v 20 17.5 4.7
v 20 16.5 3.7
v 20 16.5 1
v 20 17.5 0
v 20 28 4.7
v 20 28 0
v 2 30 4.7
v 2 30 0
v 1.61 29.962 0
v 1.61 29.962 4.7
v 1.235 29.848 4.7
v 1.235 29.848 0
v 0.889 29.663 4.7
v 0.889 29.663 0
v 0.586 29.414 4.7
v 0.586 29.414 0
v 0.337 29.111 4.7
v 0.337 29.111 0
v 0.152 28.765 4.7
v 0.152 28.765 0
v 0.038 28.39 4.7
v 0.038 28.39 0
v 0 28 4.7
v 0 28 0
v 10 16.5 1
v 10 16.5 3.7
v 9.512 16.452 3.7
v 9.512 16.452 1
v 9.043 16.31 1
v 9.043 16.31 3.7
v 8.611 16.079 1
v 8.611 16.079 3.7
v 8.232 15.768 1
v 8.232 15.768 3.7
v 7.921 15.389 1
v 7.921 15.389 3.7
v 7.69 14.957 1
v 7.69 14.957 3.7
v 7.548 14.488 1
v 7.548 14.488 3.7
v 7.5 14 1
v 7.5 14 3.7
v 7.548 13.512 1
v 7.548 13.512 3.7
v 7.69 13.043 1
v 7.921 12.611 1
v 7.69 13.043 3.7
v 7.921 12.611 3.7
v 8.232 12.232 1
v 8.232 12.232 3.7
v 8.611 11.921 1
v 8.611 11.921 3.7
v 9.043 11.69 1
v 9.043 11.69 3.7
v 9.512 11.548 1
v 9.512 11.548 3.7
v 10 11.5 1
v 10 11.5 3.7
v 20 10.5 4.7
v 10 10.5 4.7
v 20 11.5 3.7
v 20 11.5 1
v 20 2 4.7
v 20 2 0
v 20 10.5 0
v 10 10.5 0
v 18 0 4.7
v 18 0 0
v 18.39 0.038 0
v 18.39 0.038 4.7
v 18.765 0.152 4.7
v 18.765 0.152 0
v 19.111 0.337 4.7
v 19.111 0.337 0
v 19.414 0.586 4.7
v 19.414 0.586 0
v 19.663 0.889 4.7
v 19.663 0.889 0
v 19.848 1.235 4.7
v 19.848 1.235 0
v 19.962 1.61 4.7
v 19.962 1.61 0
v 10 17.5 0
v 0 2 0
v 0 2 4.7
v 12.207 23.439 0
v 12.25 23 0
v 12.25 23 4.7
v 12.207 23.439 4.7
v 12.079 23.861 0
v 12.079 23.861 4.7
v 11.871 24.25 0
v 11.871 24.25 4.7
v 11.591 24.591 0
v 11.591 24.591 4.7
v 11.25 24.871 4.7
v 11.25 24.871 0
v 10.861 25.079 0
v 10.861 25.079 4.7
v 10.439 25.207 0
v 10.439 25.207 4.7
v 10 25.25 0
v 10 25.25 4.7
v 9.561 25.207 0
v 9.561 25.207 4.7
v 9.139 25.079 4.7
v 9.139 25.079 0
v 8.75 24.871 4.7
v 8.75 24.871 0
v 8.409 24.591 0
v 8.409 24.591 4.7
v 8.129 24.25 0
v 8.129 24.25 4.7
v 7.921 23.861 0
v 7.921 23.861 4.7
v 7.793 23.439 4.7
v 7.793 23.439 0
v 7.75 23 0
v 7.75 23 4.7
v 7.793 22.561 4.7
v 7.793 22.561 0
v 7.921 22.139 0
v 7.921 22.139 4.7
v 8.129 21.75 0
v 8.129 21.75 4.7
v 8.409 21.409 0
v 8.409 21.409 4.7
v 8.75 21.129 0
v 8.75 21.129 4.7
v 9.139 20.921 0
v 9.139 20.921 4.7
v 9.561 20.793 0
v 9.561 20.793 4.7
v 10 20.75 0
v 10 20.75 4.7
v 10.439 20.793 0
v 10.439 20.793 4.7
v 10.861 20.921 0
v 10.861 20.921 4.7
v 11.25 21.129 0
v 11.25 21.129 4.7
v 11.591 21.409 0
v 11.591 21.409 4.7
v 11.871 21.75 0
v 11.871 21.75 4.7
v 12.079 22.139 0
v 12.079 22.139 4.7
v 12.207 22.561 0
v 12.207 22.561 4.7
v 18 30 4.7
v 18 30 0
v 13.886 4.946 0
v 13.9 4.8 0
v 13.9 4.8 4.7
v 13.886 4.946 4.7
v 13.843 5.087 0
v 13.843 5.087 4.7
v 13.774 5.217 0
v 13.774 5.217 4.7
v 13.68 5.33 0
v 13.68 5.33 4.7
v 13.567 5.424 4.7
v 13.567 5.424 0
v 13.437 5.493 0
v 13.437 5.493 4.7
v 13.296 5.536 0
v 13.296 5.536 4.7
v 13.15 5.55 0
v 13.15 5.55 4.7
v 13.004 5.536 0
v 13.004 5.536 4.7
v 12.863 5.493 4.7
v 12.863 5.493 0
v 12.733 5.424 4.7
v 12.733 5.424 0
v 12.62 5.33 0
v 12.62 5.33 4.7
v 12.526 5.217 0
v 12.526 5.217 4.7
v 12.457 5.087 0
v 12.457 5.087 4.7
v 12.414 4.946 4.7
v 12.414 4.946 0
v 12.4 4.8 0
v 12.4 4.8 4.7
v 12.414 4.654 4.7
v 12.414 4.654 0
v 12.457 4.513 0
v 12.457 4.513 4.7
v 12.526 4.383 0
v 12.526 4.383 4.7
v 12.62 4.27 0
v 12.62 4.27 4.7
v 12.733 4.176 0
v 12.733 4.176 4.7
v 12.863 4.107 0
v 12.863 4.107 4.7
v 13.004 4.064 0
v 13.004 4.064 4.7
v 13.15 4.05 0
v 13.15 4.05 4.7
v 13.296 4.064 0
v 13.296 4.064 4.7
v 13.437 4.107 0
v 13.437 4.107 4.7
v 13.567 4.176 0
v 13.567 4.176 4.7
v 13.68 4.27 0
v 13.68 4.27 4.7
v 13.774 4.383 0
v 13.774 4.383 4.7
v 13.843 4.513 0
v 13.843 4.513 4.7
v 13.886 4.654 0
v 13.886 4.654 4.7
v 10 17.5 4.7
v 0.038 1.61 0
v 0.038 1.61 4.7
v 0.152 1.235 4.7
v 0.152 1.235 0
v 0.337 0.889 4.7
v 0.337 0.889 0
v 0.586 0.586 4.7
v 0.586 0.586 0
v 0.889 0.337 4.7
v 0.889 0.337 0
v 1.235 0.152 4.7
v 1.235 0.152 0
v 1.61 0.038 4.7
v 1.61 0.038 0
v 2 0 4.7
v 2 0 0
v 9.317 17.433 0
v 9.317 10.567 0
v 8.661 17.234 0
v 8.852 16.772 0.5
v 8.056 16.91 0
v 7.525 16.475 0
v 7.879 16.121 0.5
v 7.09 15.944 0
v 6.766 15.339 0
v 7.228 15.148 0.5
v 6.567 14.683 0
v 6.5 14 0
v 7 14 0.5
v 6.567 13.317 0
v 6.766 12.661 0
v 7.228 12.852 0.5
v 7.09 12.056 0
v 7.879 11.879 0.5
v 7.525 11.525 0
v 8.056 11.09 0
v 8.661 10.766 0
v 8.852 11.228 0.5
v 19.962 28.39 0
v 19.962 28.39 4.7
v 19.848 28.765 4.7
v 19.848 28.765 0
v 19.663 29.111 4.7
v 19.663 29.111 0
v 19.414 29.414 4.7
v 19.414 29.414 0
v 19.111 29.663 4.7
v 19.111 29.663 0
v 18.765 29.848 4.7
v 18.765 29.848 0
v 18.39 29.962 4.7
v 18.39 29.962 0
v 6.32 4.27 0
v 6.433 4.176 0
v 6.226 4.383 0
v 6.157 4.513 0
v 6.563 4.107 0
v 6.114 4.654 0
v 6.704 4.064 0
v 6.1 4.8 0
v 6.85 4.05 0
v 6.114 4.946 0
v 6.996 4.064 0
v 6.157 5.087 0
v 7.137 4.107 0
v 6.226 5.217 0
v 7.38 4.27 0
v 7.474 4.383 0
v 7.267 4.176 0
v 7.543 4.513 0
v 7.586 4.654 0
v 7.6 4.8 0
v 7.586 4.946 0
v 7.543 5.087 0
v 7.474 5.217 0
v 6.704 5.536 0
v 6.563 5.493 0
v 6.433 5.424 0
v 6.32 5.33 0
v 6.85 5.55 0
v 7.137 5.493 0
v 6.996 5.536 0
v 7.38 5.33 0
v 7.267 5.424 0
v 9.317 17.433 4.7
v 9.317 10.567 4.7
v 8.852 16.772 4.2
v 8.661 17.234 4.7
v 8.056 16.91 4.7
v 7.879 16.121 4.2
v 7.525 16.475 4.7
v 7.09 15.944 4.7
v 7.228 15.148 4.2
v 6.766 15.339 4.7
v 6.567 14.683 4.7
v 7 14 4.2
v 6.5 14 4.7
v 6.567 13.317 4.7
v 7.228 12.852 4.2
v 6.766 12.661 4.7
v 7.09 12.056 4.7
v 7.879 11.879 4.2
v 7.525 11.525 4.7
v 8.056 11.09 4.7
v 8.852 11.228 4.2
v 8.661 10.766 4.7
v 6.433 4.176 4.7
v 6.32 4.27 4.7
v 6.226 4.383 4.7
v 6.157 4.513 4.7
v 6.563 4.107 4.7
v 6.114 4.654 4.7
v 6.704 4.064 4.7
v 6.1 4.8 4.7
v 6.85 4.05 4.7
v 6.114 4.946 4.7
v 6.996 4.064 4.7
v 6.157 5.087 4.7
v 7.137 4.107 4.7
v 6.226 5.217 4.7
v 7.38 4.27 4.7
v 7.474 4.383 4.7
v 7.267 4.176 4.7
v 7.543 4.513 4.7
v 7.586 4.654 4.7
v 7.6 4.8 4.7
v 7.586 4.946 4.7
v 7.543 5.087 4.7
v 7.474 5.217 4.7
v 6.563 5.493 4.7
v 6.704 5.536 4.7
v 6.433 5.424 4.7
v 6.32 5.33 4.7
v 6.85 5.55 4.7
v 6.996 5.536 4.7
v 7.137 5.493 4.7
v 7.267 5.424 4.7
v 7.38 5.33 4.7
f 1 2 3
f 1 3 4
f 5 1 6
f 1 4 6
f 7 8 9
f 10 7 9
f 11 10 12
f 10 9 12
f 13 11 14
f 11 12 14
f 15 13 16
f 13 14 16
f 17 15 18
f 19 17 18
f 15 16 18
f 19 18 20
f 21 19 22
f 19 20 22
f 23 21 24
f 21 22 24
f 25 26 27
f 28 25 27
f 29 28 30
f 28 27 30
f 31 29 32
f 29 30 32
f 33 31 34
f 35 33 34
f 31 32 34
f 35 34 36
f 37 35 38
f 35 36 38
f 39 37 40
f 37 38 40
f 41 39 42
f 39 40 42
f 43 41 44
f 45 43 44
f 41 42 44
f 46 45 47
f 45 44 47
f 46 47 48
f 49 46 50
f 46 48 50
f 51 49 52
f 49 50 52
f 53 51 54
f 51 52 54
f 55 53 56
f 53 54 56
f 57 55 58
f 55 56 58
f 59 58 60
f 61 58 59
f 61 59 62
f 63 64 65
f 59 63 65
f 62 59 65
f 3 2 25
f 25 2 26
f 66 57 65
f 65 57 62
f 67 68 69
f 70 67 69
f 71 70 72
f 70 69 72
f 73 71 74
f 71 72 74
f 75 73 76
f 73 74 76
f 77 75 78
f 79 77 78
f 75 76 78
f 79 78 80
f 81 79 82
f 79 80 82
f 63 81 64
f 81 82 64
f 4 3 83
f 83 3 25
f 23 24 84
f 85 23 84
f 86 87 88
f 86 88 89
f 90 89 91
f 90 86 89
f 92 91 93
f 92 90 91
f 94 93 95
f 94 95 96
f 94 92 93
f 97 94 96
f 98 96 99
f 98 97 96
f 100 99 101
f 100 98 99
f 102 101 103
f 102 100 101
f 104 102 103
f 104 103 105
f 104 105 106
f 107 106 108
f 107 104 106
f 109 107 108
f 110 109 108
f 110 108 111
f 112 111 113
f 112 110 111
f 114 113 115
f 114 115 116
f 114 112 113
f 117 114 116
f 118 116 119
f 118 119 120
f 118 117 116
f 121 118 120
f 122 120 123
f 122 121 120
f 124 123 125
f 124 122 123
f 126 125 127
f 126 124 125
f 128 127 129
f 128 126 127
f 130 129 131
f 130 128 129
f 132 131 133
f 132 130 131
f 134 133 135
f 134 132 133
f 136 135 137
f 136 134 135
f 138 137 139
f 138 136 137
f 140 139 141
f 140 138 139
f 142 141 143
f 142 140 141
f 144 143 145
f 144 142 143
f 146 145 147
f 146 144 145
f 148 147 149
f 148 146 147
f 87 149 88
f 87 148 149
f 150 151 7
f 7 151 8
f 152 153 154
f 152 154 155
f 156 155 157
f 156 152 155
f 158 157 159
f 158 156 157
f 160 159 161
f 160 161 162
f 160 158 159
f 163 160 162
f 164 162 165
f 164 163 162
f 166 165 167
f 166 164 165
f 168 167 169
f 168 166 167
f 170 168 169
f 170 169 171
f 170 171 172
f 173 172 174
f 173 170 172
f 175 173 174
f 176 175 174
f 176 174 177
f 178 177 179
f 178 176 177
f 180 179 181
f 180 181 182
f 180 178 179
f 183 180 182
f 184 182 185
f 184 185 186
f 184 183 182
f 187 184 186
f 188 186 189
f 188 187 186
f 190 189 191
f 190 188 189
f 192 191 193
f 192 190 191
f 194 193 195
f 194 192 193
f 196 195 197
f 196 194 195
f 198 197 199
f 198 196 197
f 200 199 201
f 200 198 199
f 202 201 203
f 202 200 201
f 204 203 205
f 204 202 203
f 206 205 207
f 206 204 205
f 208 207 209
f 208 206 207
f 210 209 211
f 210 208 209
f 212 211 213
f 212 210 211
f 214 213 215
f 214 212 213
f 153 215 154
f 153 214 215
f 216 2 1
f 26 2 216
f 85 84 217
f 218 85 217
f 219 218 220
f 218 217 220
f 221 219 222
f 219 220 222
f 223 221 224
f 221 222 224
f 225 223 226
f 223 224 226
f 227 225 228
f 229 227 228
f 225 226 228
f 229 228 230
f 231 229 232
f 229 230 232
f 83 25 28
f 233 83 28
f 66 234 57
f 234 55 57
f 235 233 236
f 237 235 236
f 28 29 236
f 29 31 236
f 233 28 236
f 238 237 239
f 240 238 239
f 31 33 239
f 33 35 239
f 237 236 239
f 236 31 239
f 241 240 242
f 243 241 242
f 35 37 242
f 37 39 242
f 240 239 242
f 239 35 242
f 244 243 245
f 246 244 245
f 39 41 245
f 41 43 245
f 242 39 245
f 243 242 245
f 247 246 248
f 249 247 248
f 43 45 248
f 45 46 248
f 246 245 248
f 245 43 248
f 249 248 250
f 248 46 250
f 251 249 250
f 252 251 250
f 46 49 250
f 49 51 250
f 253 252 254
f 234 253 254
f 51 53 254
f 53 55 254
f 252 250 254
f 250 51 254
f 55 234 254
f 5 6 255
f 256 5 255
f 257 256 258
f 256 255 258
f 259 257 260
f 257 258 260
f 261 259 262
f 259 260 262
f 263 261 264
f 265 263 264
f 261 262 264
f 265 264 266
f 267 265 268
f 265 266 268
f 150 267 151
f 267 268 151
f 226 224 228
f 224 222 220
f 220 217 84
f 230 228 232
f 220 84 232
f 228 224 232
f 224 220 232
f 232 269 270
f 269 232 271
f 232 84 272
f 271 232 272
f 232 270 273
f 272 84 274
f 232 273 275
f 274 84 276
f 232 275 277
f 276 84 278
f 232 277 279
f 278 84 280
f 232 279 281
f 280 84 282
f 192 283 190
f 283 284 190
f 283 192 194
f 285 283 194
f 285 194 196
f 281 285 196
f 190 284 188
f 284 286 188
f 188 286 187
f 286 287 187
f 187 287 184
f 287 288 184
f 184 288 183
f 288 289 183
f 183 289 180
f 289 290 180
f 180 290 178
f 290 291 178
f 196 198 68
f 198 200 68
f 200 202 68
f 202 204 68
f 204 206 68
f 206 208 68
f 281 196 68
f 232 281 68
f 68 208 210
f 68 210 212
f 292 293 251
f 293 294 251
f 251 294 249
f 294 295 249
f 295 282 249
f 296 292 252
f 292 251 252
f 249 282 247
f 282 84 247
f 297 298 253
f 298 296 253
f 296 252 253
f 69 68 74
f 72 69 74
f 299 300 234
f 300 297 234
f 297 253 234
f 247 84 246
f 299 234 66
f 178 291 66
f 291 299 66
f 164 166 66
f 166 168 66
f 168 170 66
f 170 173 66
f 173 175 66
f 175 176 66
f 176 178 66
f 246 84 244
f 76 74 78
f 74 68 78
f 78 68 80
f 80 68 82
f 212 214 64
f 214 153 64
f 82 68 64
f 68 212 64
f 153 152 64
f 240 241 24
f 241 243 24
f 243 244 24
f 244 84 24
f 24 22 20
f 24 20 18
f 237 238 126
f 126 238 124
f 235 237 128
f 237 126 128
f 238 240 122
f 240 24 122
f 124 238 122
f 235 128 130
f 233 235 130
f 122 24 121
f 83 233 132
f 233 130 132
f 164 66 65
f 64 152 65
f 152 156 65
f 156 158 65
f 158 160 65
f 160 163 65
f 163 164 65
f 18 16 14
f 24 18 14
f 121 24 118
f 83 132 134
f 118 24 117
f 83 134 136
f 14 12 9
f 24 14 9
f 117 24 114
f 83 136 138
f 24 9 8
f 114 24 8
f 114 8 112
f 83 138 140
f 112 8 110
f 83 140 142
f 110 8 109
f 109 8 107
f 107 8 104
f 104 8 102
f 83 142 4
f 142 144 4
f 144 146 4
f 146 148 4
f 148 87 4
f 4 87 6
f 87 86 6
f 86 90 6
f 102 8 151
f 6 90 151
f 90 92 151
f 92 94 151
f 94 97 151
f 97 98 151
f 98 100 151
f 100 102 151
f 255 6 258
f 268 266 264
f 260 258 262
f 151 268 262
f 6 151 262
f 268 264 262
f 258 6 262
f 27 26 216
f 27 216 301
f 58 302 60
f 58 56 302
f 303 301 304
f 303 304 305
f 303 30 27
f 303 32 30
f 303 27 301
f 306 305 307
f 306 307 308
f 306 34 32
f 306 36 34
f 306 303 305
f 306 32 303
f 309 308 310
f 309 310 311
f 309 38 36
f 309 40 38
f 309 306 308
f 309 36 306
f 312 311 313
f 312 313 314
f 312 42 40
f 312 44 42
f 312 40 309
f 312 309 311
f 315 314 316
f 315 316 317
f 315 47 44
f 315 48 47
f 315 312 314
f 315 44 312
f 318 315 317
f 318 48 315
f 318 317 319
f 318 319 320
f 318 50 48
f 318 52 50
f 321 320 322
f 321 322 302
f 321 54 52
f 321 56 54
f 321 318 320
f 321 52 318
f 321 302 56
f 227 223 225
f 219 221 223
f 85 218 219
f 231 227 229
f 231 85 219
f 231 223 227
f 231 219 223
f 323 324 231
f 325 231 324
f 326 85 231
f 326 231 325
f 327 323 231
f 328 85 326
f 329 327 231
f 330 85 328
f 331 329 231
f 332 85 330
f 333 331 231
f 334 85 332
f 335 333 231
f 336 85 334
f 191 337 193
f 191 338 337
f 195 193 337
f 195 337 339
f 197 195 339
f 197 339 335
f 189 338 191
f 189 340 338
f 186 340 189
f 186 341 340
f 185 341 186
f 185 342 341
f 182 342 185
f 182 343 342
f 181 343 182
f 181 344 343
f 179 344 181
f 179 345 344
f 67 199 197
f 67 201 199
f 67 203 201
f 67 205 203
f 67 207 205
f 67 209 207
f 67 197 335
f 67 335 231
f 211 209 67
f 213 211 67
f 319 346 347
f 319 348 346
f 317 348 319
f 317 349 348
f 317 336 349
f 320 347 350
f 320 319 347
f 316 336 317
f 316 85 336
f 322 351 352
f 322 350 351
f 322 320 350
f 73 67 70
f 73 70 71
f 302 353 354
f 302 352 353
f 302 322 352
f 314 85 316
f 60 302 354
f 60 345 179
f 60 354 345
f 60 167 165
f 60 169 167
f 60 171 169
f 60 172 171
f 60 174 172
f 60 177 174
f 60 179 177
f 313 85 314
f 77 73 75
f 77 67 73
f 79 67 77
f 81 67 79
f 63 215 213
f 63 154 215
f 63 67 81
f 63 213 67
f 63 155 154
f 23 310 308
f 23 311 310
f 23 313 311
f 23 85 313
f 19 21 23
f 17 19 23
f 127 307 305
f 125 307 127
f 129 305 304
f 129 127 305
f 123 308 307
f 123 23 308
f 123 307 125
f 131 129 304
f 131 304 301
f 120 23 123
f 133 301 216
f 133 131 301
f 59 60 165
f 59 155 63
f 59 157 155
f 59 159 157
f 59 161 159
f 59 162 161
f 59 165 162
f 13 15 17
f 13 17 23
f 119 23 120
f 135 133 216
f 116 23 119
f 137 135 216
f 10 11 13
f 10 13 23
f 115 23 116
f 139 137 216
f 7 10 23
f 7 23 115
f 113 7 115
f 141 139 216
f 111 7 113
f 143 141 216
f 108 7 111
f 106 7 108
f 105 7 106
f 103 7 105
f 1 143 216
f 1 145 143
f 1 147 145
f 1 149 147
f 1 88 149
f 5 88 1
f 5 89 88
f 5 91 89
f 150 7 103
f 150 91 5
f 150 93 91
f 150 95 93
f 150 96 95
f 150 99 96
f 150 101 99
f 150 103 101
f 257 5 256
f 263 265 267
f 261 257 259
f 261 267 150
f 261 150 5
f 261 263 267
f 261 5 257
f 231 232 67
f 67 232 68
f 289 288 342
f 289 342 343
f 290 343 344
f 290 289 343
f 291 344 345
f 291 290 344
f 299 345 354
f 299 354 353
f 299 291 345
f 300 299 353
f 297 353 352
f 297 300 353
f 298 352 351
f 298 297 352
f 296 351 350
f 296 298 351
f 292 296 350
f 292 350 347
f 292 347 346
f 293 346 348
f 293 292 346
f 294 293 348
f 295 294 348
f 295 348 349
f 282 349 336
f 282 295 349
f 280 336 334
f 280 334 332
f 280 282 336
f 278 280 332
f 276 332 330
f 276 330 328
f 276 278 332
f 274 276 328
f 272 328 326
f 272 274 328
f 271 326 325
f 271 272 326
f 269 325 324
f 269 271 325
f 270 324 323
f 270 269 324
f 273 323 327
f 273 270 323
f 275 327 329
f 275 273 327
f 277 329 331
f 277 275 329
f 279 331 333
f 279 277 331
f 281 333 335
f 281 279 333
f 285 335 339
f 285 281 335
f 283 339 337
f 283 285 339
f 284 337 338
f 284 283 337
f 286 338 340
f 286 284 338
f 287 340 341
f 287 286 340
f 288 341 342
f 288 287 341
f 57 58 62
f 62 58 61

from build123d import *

# Parameters (mm, degrees)
SKETCH1_R           = 2.25
SKETCH1_R_2         = 0.75
BOSS_EXTRUDE1_DEPTH = 4.7
CUT_EXTRUDE1_DEPTH  = 5.7
CHAMFER1_SIZE       = 1


with BuildPart() as part:
    # Sketch1 → Boss-Extrude1 (new body)
    with BuildSketch(Plane.XY):
        with BuildLine():
            Line((2, 0), (18, 0))
            ThreePointArc((18, 0), (19.414213562, 0.585786438), (20, 2))
            Line((20, 2), (20, 28))
            ThreePointArc((20, 28), (19.414213562, 29.414213562), (18, 30))
            Line((18, 30), (2, 30))
            ThreePointArc((2, 30), (0.585786438, 29.414213562), (0, 28))
            Line((0, 28), (0, 2))
            ThreePointArc((0, 2), (0.585786438, 0.585786438), (2, 0))
        make_face()
        with Locations((10, 23)):
            Circle(SKETCH1_R, mode=Mode.SUBTRACT)
        with Locations((6.85, 4.8)):
            Circle(SKETCH1_R_2, mode=Mode.SUBTRACT)
        with Locations((13.15, 4.8)):
            Circle(SKETCH1_R_2, mode=Mode.SUBTRACT)
    extrude(amount=BOSS_EXTRUDE1_DEPTH)

    # Sketch2 → Cut-Extrude1 (cut, through all)
    with BuildSketch(Plane.XY.offset(4.7)):
        with BuildLine():
            Line((20, 16.5), (10, 16.5))
            ThreePointArc((10, 16.5), (7.5, 14), (10, 11.5))
            Line((10, 11.5), (20, 11.5))
            Line((20, 11.5), (20, 16.5))
        make_face()
    extrude(amount=-CUT_EXTRUDE1_DEPTH, mode=Mode.SUBTRACT)

    # Chamfer1
    chamfer1_edges = [part.edges().sort_by_distance(p)[0] for p in [
        (15, 11.5, 0),
        (7.5, 14, 0),
        (15, 16.5, 0),
        (15, 16.5, 4.7),
        (7.5, 14, 4.7),
        (15, 11.5, 4.7),
    ]]
    chamfer(chamfer1_edges, length=CHAMFER1_SIZE)


solid = part.part
